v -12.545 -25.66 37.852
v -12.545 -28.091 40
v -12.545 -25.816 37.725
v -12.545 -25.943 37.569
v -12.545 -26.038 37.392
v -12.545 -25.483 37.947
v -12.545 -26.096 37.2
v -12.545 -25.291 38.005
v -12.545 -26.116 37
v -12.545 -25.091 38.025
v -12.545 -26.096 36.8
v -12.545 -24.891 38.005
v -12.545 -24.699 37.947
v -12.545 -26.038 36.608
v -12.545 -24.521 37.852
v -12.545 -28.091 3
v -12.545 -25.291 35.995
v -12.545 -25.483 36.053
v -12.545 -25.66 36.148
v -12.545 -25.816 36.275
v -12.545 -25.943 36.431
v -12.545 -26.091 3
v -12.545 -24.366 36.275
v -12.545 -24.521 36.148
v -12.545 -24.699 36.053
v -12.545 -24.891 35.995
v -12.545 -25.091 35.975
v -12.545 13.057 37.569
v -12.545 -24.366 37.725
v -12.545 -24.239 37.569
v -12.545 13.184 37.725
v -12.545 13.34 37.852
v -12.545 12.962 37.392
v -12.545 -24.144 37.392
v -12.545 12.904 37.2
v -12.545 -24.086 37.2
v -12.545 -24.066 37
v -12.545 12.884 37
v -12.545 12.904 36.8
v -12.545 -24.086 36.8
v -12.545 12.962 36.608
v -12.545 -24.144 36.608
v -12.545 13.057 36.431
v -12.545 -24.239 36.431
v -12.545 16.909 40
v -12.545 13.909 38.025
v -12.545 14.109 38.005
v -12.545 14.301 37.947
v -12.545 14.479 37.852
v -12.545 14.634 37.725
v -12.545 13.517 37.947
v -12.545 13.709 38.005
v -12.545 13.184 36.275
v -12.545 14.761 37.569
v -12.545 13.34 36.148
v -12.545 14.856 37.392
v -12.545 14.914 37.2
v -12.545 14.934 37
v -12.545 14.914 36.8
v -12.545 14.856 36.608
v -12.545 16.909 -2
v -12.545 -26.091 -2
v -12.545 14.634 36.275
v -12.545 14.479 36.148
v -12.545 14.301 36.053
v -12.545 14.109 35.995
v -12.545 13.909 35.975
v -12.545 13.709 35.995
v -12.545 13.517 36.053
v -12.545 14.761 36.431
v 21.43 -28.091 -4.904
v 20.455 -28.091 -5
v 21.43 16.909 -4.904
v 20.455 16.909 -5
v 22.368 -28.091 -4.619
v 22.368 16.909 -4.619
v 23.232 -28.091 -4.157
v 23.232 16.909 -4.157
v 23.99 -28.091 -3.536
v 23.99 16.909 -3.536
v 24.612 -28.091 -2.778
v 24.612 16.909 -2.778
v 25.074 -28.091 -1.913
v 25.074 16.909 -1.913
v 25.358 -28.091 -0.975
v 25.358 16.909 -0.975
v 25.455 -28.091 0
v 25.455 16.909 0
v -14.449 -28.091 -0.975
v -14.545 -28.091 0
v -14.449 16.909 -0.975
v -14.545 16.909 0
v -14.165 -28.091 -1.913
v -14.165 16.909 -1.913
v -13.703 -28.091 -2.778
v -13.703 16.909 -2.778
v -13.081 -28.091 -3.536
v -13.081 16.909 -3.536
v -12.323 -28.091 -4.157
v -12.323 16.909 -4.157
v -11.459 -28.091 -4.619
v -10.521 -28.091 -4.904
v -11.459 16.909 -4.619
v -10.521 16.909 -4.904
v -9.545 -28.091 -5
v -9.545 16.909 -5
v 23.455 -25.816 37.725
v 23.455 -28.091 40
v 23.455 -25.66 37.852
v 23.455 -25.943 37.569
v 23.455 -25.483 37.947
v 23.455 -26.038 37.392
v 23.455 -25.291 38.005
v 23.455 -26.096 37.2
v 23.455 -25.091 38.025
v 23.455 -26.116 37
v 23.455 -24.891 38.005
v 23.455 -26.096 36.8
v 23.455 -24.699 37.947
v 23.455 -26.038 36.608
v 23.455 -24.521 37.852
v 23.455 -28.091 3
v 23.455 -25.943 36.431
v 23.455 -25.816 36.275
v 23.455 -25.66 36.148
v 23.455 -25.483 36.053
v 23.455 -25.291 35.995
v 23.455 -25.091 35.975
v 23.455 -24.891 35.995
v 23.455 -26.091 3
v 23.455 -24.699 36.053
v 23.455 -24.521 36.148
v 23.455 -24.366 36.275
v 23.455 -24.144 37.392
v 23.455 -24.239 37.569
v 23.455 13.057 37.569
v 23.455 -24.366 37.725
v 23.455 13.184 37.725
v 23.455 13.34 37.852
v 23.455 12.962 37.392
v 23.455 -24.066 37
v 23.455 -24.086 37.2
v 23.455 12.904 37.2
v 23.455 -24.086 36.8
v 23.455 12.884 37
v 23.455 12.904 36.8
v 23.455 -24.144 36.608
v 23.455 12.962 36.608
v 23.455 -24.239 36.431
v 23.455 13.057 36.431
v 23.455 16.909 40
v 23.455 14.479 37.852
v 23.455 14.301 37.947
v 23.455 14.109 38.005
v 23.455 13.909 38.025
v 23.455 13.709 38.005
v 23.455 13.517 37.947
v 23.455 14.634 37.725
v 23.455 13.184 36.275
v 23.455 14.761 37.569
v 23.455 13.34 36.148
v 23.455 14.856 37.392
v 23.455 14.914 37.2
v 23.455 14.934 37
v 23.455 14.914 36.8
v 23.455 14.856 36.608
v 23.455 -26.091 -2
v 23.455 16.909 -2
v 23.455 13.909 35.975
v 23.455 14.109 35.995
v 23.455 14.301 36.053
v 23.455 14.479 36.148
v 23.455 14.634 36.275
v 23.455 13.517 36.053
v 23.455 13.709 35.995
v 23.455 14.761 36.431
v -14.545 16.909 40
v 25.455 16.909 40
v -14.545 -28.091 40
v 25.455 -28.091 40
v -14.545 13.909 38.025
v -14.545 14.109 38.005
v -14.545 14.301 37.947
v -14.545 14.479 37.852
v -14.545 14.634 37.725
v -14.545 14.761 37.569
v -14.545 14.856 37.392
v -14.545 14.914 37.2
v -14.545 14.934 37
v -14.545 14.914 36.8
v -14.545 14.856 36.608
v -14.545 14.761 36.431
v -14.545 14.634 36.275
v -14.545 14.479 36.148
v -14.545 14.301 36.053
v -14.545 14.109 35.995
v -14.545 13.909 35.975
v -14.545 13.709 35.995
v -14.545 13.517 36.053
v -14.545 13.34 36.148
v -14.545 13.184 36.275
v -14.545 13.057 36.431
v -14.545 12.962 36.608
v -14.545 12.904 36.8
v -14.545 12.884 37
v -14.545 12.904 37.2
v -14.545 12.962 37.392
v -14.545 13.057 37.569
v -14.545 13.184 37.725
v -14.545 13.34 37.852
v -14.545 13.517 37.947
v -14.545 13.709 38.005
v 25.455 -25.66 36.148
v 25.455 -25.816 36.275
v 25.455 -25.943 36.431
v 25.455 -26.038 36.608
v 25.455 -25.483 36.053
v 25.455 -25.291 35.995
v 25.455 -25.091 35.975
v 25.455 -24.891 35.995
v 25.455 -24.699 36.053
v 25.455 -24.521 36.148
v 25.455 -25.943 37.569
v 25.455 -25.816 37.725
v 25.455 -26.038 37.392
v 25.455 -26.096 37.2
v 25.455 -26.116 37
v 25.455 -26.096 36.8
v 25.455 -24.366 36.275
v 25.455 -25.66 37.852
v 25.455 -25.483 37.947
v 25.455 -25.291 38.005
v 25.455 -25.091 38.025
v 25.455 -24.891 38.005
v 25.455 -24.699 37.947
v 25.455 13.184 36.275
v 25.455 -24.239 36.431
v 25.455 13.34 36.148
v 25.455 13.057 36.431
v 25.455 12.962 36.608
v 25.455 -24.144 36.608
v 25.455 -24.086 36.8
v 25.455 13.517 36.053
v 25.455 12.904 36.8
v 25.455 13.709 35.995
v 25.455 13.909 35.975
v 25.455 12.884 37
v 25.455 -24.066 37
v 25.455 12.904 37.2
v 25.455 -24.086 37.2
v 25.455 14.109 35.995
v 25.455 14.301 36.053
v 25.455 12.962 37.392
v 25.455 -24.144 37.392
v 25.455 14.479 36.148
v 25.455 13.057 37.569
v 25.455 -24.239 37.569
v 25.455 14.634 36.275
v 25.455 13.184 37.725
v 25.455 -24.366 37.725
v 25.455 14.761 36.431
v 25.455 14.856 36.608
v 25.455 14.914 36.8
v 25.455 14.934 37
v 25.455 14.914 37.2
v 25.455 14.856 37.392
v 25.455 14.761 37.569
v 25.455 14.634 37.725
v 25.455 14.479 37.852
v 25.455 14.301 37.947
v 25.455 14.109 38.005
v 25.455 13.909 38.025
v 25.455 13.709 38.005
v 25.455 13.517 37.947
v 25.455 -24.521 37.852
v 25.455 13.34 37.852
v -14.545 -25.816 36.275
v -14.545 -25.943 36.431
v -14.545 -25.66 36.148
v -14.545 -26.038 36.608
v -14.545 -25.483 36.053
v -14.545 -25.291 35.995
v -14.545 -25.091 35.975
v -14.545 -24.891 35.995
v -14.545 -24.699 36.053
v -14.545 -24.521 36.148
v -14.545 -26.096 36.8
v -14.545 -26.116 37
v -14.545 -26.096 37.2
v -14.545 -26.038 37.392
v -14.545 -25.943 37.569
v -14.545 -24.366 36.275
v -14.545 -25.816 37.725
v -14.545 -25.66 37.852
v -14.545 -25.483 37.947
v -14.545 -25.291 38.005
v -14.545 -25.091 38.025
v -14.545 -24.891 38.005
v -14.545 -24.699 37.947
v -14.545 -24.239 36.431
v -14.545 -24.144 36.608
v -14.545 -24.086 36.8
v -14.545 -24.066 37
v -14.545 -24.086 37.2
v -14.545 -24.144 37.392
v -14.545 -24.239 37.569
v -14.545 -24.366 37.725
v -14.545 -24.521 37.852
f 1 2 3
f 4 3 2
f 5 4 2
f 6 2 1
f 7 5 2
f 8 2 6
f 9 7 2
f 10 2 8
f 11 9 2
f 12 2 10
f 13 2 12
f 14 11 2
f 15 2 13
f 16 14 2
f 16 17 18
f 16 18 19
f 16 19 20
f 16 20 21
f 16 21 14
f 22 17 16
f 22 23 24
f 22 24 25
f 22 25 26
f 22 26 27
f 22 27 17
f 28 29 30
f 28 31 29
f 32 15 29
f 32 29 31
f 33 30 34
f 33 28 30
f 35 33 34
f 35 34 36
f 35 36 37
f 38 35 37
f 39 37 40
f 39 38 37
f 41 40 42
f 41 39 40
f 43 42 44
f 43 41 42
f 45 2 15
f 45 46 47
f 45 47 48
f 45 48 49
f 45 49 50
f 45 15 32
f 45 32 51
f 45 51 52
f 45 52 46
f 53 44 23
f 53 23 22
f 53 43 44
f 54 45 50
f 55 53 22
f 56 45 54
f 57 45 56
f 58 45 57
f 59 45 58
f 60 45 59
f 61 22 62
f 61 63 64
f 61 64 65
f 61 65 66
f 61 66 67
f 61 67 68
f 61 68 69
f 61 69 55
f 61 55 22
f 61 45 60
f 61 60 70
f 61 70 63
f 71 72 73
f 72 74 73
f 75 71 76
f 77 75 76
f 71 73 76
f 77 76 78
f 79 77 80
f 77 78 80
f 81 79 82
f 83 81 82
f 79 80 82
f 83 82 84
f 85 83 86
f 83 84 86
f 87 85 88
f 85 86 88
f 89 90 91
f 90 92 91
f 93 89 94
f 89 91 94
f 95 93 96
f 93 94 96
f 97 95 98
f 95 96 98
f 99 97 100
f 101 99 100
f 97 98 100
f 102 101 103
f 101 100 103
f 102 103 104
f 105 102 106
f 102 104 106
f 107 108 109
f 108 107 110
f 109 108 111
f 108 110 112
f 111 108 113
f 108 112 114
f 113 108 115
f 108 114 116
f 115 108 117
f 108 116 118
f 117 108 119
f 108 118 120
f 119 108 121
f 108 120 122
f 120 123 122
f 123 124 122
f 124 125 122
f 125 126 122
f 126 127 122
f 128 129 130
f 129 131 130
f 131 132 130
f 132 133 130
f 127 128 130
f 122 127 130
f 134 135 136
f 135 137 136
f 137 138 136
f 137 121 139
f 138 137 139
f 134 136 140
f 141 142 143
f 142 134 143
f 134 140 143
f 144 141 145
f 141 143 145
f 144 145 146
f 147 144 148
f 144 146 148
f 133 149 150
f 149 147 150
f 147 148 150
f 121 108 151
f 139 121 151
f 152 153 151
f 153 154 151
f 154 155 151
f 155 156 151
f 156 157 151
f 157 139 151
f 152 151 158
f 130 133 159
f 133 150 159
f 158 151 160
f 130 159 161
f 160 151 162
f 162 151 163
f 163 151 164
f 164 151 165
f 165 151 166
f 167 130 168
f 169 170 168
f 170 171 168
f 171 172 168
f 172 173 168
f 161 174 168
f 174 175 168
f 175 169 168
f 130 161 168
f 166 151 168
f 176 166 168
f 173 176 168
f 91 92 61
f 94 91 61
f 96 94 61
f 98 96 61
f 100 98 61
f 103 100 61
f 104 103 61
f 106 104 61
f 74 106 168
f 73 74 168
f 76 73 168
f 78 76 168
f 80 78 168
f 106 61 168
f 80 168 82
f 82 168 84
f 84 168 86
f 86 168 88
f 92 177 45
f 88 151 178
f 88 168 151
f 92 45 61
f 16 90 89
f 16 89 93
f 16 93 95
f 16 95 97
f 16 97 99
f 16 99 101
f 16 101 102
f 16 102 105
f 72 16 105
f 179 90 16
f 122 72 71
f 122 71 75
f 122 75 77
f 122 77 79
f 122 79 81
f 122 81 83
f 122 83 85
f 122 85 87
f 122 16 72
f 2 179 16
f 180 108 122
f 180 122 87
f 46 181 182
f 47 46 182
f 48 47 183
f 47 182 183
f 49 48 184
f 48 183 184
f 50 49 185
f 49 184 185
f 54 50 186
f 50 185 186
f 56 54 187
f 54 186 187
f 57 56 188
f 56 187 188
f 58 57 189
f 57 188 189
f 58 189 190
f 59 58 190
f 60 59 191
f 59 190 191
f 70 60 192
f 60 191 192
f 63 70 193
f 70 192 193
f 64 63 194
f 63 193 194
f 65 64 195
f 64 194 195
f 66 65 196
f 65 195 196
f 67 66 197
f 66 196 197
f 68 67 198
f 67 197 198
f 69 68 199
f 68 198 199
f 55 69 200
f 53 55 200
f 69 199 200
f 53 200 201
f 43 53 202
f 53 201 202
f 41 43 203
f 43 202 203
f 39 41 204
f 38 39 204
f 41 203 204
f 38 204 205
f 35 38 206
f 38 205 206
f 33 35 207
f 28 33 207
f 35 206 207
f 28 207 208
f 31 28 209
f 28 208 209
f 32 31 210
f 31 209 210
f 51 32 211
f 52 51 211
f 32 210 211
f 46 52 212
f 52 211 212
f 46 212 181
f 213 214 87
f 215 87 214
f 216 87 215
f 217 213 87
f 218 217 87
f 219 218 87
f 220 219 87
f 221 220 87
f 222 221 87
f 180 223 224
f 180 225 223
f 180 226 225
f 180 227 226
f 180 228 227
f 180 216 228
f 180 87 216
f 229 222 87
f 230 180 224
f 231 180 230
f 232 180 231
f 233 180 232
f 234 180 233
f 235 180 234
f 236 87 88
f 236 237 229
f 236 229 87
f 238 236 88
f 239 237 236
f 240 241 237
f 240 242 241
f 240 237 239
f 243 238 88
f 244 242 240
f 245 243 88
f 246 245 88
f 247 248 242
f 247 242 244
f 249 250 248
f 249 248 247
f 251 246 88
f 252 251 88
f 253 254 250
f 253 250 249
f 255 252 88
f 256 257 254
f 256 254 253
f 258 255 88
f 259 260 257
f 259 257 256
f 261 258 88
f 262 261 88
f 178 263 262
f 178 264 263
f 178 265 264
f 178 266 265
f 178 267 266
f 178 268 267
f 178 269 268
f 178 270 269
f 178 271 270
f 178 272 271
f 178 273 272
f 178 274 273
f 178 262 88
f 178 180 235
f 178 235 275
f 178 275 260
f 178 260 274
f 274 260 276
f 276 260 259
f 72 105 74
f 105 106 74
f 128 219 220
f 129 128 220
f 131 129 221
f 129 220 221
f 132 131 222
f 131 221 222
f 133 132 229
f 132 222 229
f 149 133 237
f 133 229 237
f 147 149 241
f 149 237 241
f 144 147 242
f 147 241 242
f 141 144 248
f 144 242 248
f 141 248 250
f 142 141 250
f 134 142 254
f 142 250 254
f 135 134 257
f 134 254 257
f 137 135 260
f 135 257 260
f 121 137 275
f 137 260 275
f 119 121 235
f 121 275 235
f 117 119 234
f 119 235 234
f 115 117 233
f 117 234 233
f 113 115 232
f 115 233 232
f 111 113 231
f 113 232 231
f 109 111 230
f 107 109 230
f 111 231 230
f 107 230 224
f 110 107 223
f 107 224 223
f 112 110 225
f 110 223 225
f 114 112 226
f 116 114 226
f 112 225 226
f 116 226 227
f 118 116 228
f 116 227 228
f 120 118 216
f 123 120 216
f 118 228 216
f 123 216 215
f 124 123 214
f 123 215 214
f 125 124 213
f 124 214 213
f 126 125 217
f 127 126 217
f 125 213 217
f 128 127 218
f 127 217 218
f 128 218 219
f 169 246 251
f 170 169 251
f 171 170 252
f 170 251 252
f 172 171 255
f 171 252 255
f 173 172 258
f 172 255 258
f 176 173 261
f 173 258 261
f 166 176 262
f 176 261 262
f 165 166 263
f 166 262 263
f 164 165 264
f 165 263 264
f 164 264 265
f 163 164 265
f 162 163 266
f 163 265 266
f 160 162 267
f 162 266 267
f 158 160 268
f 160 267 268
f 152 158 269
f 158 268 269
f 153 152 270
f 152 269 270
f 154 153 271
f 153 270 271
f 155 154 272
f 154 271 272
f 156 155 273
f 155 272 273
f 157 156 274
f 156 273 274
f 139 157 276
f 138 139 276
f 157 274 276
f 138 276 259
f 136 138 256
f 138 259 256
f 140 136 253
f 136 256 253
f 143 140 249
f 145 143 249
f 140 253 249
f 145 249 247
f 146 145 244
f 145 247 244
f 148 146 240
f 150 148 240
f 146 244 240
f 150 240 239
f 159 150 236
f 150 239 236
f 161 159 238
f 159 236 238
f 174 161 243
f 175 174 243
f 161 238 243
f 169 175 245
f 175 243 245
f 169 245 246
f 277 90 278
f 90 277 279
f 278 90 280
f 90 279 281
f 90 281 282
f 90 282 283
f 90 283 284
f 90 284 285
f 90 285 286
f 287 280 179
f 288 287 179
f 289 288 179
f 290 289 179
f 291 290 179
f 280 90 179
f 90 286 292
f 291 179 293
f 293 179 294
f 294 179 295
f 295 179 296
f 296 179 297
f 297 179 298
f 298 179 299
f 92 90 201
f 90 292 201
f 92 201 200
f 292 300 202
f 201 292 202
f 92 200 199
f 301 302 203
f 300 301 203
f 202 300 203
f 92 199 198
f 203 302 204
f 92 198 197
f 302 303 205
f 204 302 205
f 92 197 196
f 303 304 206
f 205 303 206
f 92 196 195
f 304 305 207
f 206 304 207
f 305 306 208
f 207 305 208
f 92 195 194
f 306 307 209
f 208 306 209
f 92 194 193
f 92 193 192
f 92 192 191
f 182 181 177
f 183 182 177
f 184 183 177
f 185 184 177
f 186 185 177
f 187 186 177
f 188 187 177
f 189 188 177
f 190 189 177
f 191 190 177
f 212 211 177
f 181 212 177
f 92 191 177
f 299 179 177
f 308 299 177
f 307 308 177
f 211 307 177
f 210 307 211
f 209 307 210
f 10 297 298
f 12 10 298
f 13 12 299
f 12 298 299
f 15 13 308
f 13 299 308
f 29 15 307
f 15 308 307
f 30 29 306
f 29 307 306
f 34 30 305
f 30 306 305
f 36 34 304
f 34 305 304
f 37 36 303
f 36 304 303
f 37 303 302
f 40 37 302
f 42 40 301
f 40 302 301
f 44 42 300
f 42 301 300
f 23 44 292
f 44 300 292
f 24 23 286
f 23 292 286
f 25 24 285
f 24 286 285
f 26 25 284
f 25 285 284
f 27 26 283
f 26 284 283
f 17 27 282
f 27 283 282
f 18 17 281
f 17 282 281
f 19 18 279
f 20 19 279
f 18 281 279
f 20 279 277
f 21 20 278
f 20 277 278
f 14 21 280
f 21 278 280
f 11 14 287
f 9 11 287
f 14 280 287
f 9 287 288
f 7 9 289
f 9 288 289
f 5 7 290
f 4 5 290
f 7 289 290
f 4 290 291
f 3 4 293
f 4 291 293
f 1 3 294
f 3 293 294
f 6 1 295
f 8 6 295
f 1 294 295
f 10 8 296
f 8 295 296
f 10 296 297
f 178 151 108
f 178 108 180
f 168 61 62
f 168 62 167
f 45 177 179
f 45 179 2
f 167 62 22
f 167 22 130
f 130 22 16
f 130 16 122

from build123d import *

# Parameters (mm, degrees)
SKETCH_1_W           = 40
SKETCH_1_H           = 45
EXTRUDE_1_DEPTH      = 40
EXTRUDE_1_DEPTH_BACK = 5
SKETCH_2_W           = 36
SKETCH_2_H           = 37
CUT_EXTRUDE_1_DEPTH  = 50
SKETCH_3_R           = 1.025
CUT_EXTRUDE_2_DEPTH  = 2
SKETCH_4_R           = 1.025
CUT_EXTRUDE_3_DEPTH  = 2
SKETCH_5_W           = 36
SKETCH_5_H           = 5
CUT_EXTRUDE_4_DEPTH  = 43
FILLET_6_R           = 5
FILLET_7_R           = 5


with BuildPart() as part:
    # 草圖1 → 填料-伸長1 (new body, two sides)
    with BuildSketch(Plane.XY) as extrude_1_sk:
        with Locations((5.454545455, -5.590909091)):
            Rectangle(SKETCH_1_W, SKETCH_1_H)
    extrude(amount=EXTRUDE_1_DEPTH)
    extrude(extrude_1_sk.sketch, amount=-EXTRUDE_1_DEPTH_BACK)

    # 草圖2 → 除料-伸長1 (cut)
    with BuildSketch(Plane(origin=(0, 16.909090909, 0), x_dir=(1, 0, 0), z_dir=(0, 1, 0))):
        with Locations((5.454545455, -21.5)):
            Rectangle(SKETCH_2_W, SKETCH_2_H)
    extrude(amount=-CUT_EXTRUDE_1_DEPTH, mode=Mode.SUBTRACT)

    # 草圖3 → 除料-伸長2 (cut)
    with BuildSketch(Plane.ZY.offset(14.545454545)):
        with Locations((37, -25.090909091)):
            Circle(SKETCH_3_R)
        with Locations((37, 13.909090909)):
            Circle(SKETCH_3_R)
    extrude(amount=-CUT_EXTRUDE_2_DEPTH, mode=Mode.SUBTRACT)

    # 草圖4 → 除料-伸長3 (cut)
    with BuildSketch(Plane(origin=(25.454545455, 0, 0), x_dir=(0, 0, -1), z_dir=(1, 0, 0))):
        with Locations((-37, 13.909090909)):
            Circle(SKETCH_4_R)
        with Locations((-37, -25.090909091)):
            Circle(SKETCH_4_R)
    extrude(amount=-CUT_EXTRUDE_3_DEPTH, mode=Mode.SUBTRACT)

    # 草圖5 → 除料-伸長4 (cut)
    with BuildSketch(Plane(origin=(0, 16.909090909, 0), x_dir=(1, 0, 0), z_dir=(0, 1, 0))):
        with Locations((5.454545455, -0.5)):
            Rectangle(SKETCH_5_W, SKETCH_5_H)
    extrude(amount=-CUT_EXTRUDE_4_DEPTH, mode=Mode.SUBTRACT)

    # 圓角6
    fillet_6_edges = [part.edges().sort_by_distance(p)[0] for p in [
        (-14.545454545, -5.590909091, -5),
    ]]
    fillet(fillet_6_edges, radius=FILLET_6_R)

    # 圓角7
    fillet_7_edges = [part.edges().sort_by_distance(p)[0] for p in [
        (25.454545455, -5.590909091, -5),
    ]]
    fillet(fillet_7_edges, radius=FILLET_7_R)


solid = part.part
